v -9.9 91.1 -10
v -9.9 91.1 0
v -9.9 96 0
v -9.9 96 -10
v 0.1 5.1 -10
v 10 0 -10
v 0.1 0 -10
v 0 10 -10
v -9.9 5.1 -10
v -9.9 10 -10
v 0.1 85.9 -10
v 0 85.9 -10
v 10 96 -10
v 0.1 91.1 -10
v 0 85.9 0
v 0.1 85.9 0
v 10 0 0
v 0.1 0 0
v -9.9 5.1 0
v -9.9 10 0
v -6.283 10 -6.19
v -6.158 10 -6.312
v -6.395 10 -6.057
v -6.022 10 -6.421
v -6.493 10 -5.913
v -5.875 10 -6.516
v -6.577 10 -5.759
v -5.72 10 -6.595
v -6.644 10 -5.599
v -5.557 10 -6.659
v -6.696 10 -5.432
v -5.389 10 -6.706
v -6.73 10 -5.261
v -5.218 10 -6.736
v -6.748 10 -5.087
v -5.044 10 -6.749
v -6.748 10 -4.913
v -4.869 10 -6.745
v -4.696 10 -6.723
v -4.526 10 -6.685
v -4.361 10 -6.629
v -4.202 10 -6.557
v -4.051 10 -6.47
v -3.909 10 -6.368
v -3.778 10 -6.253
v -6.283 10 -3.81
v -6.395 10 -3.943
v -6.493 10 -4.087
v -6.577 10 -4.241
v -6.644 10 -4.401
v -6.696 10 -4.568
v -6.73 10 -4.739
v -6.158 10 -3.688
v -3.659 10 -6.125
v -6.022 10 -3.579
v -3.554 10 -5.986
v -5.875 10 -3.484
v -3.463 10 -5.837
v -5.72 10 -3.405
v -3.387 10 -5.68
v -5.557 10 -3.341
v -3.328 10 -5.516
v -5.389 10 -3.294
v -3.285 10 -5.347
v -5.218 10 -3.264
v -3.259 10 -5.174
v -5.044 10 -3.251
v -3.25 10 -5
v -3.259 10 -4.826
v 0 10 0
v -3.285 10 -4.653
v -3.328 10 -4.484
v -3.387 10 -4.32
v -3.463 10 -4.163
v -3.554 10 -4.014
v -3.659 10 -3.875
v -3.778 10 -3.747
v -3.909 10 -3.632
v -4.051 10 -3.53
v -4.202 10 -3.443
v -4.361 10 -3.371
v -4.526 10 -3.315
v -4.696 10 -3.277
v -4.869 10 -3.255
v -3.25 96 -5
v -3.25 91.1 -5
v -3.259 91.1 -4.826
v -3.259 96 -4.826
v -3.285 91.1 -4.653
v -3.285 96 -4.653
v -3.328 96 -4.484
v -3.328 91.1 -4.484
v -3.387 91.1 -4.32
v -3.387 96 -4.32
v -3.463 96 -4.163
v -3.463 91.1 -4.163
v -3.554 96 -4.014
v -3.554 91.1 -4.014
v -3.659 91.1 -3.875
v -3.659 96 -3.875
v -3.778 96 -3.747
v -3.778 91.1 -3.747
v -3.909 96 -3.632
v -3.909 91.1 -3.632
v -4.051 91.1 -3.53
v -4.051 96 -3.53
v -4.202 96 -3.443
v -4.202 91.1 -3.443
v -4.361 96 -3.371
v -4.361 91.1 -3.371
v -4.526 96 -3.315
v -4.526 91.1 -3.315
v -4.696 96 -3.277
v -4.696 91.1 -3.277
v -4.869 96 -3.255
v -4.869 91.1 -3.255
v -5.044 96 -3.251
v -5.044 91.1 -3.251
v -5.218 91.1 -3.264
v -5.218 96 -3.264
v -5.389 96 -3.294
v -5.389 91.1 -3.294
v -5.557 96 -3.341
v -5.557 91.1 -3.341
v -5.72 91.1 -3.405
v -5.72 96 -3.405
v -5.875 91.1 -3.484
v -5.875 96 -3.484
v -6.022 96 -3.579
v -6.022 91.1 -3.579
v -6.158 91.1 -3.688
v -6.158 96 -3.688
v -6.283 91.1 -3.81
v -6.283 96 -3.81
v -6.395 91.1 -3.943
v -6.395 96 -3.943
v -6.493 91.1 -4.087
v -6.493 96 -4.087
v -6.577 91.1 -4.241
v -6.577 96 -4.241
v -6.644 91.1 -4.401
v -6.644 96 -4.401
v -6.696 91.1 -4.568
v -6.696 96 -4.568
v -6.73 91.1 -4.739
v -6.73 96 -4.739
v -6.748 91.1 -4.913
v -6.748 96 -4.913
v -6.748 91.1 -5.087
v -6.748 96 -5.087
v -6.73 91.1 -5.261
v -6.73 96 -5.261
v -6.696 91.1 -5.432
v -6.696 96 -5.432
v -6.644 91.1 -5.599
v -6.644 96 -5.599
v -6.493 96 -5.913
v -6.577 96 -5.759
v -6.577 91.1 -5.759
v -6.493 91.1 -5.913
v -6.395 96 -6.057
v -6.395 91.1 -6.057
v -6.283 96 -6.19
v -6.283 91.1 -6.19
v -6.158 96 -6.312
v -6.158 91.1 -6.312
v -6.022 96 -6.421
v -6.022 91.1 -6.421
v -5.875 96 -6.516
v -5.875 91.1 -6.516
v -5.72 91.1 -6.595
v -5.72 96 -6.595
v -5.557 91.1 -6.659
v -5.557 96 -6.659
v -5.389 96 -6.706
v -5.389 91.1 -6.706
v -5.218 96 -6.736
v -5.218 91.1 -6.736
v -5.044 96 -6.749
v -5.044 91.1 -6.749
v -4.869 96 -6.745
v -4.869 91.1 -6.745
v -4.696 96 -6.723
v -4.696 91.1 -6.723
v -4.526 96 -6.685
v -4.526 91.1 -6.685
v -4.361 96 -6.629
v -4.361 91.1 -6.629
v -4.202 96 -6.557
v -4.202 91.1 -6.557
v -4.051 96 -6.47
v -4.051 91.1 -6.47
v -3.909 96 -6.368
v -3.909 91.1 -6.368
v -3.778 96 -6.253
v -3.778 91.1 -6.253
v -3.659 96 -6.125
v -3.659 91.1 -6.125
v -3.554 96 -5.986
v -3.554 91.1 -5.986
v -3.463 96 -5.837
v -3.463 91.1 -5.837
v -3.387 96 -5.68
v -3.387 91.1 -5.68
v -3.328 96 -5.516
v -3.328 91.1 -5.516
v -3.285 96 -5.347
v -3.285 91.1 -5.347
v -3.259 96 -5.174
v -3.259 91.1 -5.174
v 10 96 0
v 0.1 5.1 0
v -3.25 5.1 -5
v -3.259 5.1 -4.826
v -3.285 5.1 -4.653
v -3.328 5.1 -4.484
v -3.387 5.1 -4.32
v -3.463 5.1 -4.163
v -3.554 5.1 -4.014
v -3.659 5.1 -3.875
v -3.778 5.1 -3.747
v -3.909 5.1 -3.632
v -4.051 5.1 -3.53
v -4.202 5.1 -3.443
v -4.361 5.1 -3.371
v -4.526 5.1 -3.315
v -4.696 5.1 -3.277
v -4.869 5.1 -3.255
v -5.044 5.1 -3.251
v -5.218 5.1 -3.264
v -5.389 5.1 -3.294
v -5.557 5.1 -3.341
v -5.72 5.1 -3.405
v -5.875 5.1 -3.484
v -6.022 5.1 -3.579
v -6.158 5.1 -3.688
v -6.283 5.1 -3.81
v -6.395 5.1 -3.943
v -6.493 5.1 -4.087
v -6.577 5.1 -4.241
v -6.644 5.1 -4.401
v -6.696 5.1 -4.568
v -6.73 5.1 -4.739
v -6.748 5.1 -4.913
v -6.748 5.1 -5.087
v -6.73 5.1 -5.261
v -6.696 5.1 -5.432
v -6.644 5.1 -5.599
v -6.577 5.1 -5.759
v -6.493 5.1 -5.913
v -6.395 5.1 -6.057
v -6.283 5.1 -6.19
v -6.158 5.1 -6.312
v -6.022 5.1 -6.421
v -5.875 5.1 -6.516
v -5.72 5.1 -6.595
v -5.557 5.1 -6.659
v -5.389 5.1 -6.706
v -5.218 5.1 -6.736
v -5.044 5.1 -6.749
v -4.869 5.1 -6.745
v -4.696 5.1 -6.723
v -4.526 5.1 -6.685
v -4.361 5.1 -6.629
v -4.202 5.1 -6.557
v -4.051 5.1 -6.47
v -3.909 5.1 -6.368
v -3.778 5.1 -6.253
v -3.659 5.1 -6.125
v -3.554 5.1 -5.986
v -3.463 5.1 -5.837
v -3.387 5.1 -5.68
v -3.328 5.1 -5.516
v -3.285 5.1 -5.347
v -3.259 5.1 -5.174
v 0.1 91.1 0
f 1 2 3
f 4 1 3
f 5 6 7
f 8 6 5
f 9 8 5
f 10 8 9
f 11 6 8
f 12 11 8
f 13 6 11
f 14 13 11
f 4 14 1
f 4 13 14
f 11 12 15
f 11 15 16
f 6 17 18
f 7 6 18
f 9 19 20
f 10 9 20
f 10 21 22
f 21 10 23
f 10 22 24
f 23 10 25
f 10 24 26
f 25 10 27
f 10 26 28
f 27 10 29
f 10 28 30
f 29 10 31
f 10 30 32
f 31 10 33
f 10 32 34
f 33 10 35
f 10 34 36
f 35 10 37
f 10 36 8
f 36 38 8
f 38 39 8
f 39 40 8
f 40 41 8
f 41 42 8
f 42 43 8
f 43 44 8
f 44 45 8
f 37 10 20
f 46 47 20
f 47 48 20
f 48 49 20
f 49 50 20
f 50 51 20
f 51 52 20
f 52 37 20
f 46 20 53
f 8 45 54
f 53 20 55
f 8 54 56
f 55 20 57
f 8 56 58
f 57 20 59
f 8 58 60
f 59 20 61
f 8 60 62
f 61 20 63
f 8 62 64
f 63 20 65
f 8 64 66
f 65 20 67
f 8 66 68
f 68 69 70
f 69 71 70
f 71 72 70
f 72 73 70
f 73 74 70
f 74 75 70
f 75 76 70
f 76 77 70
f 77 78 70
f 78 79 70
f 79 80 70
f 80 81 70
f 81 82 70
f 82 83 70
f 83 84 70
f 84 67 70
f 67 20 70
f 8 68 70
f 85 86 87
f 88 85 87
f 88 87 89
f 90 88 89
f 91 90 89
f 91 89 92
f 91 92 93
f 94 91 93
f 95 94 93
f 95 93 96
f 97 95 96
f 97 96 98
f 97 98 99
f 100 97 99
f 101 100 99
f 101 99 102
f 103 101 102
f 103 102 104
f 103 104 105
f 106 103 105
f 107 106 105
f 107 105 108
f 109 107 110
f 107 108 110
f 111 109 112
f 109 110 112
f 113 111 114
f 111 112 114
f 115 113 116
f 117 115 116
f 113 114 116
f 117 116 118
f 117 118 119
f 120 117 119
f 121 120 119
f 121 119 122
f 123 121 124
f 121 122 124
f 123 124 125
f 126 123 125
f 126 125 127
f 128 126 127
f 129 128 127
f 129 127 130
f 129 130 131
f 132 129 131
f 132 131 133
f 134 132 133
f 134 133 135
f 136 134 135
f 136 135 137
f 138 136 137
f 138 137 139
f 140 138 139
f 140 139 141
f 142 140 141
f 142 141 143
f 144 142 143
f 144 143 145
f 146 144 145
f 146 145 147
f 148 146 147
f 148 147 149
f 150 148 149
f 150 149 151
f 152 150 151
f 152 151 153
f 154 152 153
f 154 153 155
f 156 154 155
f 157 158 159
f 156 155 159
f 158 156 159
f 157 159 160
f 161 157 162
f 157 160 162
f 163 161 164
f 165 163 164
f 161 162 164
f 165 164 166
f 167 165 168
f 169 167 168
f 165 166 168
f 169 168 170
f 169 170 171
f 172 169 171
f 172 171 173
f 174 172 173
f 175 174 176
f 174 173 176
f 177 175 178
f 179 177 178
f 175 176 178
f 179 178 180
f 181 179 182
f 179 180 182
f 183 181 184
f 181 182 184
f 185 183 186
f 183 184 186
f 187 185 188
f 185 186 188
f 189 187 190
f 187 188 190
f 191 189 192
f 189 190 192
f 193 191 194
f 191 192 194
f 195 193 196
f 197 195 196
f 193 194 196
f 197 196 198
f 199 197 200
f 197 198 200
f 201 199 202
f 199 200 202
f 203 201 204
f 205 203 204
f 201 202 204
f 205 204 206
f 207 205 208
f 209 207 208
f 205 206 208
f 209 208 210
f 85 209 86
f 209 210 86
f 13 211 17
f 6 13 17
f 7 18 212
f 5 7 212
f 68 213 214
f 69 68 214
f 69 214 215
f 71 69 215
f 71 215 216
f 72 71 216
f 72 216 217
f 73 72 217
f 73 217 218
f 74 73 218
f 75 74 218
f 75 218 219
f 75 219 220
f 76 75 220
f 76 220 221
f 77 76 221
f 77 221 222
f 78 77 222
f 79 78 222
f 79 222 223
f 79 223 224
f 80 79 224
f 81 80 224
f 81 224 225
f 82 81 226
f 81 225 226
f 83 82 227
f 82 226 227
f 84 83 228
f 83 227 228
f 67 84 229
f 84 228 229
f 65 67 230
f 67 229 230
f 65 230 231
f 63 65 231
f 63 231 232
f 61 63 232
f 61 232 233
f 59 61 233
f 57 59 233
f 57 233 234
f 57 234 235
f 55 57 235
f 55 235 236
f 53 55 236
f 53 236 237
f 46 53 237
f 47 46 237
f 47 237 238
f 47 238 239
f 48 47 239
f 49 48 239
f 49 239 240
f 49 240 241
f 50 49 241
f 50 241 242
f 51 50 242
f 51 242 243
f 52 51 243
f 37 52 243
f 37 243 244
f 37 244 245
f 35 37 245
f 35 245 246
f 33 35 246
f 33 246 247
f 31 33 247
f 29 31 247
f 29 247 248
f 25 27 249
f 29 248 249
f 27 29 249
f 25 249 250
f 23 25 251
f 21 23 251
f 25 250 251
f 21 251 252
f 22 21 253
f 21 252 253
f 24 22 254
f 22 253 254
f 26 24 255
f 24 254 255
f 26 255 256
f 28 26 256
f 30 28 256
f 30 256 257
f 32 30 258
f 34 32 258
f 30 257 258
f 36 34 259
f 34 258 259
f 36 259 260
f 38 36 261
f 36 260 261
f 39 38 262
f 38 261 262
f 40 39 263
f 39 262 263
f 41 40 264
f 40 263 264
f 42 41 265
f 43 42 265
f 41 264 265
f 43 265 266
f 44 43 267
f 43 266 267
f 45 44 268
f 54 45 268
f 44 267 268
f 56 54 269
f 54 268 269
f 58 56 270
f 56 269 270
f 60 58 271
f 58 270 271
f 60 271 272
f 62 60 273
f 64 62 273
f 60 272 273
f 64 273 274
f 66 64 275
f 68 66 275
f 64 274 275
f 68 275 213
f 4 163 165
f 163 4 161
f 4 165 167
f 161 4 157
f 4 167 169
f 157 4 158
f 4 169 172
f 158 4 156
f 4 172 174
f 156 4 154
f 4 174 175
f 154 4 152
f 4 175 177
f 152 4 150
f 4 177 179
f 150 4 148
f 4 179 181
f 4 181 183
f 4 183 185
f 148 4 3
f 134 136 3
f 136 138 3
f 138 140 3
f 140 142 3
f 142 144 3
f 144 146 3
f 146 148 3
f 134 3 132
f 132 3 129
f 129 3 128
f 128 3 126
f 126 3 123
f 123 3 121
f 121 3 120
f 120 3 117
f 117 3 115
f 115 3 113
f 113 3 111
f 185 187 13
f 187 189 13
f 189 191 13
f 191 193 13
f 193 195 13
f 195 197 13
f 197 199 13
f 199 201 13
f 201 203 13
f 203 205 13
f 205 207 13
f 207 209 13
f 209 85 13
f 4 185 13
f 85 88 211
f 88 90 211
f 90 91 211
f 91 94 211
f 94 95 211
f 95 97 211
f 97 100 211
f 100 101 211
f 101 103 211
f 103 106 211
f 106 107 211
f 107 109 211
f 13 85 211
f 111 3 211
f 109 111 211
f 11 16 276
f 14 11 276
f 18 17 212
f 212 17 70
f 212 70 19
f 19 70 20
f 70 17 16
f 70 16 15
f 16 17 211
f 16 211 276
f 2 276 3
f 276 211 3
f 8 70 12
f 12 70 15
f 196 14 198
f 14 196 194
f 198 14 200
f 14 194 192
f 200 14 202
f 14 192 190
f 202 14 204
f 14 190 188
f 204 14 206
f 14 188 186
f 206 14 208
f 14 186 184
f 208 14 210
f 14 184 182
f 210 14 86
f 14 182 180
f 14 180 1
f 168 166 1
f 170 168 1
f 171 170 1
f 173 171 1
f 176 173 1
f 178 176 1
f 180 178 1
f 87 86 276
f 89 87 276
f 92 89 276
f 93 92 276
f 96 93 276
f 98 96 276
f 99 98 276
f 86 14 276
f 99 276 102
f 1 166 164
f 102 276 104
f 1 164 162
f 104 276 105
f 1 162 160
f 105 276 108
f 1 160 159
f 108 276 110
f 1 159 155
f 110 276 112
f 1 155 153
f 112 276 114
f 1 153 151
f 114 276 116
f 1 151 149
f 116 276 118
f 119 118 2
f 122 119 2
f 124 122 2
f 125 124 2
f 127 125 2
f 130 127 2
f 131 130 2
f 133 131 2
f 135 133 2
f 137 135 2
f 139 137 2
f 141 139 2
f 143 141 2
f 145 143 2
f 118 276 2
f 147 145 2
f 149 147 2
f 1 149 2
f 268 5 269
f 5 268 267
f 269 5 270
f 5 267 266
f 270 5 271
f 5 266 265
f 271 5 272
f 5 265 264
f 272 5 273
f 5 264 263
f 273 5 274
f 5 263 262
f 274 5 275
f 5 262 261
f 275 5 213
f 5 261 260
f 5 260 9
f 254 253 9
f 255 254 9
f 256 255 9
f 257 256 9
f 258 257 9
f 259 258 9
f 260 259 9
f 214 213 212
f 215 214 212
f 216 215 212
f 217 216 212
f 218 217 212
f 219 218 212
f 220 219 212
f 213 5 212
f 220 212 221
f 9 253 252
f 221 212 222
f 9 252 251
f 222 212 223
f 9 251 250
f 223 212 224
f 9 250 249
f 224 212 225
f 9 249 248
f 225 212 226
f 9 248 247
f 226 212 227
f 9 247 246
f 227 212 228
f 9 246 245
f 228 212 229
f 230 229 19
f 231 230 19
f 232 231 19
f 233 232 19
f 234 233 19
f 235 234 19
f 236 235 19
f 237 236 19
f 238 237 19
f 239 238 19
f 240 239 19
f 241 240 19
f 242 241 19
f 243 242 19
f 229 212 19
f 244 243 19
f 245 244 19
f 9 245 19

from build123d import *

# Parameters (mm, degrees)
BOSS_EXTRUDE1_DEPTH = 10
CUT_EXTRUDE1_DEPTH  = 11
SKETCH3_R           = 1.75
CUT_EXTRUDE2_DEPTH  = 91.9


with BuildPart() as part:
    # Sketch1 → Boss-Extrude1 (new body)
    with BuildSketch(Plane.XY):
        Polygon((0, 0), (0, 5), (-10, 5), (-10, 10), (0, 10), (0, 91), (-10, 91), (-10, 96), (10, 96), (10, 0), align=None)
    extrude(amount=-BOSS_EXTRUDE1_DEPTH)

    # Sketch2 → Cut-Extrude1 (cut, through all)
    with BuildSketch(Plane.XY):
        Polygon((-10, 10), (-10, 5), (0, 5), (0, 0), (0.1, 0), (0.1, 5.1), (-9.9, 5.1), (-9.9, 10), align=None)
        Polygon((-10, 96), (-10, 91), (0, 91), (0, 85.9), (0.1, 85.9), (0.1, 91.1), (-9.9, 91.1), (-9.9, 96), align=None)
    extrude(amount=-CUT_EXTRUDE1_DEPTH, mode=Mode.SUBTRACT)

    # Sketch3 → Cut-Extrude2 (cut, through all)
    with BuildSketch(Plane.XZ.offset(-5.1)):
        with Locations((-5, -5)):
            Circle(SKETCH3_R)
    extrude(amount=-CUT_EXTRUDE2_DEPTH, mode=Mode.SUBTRACT)


solid = part.part
